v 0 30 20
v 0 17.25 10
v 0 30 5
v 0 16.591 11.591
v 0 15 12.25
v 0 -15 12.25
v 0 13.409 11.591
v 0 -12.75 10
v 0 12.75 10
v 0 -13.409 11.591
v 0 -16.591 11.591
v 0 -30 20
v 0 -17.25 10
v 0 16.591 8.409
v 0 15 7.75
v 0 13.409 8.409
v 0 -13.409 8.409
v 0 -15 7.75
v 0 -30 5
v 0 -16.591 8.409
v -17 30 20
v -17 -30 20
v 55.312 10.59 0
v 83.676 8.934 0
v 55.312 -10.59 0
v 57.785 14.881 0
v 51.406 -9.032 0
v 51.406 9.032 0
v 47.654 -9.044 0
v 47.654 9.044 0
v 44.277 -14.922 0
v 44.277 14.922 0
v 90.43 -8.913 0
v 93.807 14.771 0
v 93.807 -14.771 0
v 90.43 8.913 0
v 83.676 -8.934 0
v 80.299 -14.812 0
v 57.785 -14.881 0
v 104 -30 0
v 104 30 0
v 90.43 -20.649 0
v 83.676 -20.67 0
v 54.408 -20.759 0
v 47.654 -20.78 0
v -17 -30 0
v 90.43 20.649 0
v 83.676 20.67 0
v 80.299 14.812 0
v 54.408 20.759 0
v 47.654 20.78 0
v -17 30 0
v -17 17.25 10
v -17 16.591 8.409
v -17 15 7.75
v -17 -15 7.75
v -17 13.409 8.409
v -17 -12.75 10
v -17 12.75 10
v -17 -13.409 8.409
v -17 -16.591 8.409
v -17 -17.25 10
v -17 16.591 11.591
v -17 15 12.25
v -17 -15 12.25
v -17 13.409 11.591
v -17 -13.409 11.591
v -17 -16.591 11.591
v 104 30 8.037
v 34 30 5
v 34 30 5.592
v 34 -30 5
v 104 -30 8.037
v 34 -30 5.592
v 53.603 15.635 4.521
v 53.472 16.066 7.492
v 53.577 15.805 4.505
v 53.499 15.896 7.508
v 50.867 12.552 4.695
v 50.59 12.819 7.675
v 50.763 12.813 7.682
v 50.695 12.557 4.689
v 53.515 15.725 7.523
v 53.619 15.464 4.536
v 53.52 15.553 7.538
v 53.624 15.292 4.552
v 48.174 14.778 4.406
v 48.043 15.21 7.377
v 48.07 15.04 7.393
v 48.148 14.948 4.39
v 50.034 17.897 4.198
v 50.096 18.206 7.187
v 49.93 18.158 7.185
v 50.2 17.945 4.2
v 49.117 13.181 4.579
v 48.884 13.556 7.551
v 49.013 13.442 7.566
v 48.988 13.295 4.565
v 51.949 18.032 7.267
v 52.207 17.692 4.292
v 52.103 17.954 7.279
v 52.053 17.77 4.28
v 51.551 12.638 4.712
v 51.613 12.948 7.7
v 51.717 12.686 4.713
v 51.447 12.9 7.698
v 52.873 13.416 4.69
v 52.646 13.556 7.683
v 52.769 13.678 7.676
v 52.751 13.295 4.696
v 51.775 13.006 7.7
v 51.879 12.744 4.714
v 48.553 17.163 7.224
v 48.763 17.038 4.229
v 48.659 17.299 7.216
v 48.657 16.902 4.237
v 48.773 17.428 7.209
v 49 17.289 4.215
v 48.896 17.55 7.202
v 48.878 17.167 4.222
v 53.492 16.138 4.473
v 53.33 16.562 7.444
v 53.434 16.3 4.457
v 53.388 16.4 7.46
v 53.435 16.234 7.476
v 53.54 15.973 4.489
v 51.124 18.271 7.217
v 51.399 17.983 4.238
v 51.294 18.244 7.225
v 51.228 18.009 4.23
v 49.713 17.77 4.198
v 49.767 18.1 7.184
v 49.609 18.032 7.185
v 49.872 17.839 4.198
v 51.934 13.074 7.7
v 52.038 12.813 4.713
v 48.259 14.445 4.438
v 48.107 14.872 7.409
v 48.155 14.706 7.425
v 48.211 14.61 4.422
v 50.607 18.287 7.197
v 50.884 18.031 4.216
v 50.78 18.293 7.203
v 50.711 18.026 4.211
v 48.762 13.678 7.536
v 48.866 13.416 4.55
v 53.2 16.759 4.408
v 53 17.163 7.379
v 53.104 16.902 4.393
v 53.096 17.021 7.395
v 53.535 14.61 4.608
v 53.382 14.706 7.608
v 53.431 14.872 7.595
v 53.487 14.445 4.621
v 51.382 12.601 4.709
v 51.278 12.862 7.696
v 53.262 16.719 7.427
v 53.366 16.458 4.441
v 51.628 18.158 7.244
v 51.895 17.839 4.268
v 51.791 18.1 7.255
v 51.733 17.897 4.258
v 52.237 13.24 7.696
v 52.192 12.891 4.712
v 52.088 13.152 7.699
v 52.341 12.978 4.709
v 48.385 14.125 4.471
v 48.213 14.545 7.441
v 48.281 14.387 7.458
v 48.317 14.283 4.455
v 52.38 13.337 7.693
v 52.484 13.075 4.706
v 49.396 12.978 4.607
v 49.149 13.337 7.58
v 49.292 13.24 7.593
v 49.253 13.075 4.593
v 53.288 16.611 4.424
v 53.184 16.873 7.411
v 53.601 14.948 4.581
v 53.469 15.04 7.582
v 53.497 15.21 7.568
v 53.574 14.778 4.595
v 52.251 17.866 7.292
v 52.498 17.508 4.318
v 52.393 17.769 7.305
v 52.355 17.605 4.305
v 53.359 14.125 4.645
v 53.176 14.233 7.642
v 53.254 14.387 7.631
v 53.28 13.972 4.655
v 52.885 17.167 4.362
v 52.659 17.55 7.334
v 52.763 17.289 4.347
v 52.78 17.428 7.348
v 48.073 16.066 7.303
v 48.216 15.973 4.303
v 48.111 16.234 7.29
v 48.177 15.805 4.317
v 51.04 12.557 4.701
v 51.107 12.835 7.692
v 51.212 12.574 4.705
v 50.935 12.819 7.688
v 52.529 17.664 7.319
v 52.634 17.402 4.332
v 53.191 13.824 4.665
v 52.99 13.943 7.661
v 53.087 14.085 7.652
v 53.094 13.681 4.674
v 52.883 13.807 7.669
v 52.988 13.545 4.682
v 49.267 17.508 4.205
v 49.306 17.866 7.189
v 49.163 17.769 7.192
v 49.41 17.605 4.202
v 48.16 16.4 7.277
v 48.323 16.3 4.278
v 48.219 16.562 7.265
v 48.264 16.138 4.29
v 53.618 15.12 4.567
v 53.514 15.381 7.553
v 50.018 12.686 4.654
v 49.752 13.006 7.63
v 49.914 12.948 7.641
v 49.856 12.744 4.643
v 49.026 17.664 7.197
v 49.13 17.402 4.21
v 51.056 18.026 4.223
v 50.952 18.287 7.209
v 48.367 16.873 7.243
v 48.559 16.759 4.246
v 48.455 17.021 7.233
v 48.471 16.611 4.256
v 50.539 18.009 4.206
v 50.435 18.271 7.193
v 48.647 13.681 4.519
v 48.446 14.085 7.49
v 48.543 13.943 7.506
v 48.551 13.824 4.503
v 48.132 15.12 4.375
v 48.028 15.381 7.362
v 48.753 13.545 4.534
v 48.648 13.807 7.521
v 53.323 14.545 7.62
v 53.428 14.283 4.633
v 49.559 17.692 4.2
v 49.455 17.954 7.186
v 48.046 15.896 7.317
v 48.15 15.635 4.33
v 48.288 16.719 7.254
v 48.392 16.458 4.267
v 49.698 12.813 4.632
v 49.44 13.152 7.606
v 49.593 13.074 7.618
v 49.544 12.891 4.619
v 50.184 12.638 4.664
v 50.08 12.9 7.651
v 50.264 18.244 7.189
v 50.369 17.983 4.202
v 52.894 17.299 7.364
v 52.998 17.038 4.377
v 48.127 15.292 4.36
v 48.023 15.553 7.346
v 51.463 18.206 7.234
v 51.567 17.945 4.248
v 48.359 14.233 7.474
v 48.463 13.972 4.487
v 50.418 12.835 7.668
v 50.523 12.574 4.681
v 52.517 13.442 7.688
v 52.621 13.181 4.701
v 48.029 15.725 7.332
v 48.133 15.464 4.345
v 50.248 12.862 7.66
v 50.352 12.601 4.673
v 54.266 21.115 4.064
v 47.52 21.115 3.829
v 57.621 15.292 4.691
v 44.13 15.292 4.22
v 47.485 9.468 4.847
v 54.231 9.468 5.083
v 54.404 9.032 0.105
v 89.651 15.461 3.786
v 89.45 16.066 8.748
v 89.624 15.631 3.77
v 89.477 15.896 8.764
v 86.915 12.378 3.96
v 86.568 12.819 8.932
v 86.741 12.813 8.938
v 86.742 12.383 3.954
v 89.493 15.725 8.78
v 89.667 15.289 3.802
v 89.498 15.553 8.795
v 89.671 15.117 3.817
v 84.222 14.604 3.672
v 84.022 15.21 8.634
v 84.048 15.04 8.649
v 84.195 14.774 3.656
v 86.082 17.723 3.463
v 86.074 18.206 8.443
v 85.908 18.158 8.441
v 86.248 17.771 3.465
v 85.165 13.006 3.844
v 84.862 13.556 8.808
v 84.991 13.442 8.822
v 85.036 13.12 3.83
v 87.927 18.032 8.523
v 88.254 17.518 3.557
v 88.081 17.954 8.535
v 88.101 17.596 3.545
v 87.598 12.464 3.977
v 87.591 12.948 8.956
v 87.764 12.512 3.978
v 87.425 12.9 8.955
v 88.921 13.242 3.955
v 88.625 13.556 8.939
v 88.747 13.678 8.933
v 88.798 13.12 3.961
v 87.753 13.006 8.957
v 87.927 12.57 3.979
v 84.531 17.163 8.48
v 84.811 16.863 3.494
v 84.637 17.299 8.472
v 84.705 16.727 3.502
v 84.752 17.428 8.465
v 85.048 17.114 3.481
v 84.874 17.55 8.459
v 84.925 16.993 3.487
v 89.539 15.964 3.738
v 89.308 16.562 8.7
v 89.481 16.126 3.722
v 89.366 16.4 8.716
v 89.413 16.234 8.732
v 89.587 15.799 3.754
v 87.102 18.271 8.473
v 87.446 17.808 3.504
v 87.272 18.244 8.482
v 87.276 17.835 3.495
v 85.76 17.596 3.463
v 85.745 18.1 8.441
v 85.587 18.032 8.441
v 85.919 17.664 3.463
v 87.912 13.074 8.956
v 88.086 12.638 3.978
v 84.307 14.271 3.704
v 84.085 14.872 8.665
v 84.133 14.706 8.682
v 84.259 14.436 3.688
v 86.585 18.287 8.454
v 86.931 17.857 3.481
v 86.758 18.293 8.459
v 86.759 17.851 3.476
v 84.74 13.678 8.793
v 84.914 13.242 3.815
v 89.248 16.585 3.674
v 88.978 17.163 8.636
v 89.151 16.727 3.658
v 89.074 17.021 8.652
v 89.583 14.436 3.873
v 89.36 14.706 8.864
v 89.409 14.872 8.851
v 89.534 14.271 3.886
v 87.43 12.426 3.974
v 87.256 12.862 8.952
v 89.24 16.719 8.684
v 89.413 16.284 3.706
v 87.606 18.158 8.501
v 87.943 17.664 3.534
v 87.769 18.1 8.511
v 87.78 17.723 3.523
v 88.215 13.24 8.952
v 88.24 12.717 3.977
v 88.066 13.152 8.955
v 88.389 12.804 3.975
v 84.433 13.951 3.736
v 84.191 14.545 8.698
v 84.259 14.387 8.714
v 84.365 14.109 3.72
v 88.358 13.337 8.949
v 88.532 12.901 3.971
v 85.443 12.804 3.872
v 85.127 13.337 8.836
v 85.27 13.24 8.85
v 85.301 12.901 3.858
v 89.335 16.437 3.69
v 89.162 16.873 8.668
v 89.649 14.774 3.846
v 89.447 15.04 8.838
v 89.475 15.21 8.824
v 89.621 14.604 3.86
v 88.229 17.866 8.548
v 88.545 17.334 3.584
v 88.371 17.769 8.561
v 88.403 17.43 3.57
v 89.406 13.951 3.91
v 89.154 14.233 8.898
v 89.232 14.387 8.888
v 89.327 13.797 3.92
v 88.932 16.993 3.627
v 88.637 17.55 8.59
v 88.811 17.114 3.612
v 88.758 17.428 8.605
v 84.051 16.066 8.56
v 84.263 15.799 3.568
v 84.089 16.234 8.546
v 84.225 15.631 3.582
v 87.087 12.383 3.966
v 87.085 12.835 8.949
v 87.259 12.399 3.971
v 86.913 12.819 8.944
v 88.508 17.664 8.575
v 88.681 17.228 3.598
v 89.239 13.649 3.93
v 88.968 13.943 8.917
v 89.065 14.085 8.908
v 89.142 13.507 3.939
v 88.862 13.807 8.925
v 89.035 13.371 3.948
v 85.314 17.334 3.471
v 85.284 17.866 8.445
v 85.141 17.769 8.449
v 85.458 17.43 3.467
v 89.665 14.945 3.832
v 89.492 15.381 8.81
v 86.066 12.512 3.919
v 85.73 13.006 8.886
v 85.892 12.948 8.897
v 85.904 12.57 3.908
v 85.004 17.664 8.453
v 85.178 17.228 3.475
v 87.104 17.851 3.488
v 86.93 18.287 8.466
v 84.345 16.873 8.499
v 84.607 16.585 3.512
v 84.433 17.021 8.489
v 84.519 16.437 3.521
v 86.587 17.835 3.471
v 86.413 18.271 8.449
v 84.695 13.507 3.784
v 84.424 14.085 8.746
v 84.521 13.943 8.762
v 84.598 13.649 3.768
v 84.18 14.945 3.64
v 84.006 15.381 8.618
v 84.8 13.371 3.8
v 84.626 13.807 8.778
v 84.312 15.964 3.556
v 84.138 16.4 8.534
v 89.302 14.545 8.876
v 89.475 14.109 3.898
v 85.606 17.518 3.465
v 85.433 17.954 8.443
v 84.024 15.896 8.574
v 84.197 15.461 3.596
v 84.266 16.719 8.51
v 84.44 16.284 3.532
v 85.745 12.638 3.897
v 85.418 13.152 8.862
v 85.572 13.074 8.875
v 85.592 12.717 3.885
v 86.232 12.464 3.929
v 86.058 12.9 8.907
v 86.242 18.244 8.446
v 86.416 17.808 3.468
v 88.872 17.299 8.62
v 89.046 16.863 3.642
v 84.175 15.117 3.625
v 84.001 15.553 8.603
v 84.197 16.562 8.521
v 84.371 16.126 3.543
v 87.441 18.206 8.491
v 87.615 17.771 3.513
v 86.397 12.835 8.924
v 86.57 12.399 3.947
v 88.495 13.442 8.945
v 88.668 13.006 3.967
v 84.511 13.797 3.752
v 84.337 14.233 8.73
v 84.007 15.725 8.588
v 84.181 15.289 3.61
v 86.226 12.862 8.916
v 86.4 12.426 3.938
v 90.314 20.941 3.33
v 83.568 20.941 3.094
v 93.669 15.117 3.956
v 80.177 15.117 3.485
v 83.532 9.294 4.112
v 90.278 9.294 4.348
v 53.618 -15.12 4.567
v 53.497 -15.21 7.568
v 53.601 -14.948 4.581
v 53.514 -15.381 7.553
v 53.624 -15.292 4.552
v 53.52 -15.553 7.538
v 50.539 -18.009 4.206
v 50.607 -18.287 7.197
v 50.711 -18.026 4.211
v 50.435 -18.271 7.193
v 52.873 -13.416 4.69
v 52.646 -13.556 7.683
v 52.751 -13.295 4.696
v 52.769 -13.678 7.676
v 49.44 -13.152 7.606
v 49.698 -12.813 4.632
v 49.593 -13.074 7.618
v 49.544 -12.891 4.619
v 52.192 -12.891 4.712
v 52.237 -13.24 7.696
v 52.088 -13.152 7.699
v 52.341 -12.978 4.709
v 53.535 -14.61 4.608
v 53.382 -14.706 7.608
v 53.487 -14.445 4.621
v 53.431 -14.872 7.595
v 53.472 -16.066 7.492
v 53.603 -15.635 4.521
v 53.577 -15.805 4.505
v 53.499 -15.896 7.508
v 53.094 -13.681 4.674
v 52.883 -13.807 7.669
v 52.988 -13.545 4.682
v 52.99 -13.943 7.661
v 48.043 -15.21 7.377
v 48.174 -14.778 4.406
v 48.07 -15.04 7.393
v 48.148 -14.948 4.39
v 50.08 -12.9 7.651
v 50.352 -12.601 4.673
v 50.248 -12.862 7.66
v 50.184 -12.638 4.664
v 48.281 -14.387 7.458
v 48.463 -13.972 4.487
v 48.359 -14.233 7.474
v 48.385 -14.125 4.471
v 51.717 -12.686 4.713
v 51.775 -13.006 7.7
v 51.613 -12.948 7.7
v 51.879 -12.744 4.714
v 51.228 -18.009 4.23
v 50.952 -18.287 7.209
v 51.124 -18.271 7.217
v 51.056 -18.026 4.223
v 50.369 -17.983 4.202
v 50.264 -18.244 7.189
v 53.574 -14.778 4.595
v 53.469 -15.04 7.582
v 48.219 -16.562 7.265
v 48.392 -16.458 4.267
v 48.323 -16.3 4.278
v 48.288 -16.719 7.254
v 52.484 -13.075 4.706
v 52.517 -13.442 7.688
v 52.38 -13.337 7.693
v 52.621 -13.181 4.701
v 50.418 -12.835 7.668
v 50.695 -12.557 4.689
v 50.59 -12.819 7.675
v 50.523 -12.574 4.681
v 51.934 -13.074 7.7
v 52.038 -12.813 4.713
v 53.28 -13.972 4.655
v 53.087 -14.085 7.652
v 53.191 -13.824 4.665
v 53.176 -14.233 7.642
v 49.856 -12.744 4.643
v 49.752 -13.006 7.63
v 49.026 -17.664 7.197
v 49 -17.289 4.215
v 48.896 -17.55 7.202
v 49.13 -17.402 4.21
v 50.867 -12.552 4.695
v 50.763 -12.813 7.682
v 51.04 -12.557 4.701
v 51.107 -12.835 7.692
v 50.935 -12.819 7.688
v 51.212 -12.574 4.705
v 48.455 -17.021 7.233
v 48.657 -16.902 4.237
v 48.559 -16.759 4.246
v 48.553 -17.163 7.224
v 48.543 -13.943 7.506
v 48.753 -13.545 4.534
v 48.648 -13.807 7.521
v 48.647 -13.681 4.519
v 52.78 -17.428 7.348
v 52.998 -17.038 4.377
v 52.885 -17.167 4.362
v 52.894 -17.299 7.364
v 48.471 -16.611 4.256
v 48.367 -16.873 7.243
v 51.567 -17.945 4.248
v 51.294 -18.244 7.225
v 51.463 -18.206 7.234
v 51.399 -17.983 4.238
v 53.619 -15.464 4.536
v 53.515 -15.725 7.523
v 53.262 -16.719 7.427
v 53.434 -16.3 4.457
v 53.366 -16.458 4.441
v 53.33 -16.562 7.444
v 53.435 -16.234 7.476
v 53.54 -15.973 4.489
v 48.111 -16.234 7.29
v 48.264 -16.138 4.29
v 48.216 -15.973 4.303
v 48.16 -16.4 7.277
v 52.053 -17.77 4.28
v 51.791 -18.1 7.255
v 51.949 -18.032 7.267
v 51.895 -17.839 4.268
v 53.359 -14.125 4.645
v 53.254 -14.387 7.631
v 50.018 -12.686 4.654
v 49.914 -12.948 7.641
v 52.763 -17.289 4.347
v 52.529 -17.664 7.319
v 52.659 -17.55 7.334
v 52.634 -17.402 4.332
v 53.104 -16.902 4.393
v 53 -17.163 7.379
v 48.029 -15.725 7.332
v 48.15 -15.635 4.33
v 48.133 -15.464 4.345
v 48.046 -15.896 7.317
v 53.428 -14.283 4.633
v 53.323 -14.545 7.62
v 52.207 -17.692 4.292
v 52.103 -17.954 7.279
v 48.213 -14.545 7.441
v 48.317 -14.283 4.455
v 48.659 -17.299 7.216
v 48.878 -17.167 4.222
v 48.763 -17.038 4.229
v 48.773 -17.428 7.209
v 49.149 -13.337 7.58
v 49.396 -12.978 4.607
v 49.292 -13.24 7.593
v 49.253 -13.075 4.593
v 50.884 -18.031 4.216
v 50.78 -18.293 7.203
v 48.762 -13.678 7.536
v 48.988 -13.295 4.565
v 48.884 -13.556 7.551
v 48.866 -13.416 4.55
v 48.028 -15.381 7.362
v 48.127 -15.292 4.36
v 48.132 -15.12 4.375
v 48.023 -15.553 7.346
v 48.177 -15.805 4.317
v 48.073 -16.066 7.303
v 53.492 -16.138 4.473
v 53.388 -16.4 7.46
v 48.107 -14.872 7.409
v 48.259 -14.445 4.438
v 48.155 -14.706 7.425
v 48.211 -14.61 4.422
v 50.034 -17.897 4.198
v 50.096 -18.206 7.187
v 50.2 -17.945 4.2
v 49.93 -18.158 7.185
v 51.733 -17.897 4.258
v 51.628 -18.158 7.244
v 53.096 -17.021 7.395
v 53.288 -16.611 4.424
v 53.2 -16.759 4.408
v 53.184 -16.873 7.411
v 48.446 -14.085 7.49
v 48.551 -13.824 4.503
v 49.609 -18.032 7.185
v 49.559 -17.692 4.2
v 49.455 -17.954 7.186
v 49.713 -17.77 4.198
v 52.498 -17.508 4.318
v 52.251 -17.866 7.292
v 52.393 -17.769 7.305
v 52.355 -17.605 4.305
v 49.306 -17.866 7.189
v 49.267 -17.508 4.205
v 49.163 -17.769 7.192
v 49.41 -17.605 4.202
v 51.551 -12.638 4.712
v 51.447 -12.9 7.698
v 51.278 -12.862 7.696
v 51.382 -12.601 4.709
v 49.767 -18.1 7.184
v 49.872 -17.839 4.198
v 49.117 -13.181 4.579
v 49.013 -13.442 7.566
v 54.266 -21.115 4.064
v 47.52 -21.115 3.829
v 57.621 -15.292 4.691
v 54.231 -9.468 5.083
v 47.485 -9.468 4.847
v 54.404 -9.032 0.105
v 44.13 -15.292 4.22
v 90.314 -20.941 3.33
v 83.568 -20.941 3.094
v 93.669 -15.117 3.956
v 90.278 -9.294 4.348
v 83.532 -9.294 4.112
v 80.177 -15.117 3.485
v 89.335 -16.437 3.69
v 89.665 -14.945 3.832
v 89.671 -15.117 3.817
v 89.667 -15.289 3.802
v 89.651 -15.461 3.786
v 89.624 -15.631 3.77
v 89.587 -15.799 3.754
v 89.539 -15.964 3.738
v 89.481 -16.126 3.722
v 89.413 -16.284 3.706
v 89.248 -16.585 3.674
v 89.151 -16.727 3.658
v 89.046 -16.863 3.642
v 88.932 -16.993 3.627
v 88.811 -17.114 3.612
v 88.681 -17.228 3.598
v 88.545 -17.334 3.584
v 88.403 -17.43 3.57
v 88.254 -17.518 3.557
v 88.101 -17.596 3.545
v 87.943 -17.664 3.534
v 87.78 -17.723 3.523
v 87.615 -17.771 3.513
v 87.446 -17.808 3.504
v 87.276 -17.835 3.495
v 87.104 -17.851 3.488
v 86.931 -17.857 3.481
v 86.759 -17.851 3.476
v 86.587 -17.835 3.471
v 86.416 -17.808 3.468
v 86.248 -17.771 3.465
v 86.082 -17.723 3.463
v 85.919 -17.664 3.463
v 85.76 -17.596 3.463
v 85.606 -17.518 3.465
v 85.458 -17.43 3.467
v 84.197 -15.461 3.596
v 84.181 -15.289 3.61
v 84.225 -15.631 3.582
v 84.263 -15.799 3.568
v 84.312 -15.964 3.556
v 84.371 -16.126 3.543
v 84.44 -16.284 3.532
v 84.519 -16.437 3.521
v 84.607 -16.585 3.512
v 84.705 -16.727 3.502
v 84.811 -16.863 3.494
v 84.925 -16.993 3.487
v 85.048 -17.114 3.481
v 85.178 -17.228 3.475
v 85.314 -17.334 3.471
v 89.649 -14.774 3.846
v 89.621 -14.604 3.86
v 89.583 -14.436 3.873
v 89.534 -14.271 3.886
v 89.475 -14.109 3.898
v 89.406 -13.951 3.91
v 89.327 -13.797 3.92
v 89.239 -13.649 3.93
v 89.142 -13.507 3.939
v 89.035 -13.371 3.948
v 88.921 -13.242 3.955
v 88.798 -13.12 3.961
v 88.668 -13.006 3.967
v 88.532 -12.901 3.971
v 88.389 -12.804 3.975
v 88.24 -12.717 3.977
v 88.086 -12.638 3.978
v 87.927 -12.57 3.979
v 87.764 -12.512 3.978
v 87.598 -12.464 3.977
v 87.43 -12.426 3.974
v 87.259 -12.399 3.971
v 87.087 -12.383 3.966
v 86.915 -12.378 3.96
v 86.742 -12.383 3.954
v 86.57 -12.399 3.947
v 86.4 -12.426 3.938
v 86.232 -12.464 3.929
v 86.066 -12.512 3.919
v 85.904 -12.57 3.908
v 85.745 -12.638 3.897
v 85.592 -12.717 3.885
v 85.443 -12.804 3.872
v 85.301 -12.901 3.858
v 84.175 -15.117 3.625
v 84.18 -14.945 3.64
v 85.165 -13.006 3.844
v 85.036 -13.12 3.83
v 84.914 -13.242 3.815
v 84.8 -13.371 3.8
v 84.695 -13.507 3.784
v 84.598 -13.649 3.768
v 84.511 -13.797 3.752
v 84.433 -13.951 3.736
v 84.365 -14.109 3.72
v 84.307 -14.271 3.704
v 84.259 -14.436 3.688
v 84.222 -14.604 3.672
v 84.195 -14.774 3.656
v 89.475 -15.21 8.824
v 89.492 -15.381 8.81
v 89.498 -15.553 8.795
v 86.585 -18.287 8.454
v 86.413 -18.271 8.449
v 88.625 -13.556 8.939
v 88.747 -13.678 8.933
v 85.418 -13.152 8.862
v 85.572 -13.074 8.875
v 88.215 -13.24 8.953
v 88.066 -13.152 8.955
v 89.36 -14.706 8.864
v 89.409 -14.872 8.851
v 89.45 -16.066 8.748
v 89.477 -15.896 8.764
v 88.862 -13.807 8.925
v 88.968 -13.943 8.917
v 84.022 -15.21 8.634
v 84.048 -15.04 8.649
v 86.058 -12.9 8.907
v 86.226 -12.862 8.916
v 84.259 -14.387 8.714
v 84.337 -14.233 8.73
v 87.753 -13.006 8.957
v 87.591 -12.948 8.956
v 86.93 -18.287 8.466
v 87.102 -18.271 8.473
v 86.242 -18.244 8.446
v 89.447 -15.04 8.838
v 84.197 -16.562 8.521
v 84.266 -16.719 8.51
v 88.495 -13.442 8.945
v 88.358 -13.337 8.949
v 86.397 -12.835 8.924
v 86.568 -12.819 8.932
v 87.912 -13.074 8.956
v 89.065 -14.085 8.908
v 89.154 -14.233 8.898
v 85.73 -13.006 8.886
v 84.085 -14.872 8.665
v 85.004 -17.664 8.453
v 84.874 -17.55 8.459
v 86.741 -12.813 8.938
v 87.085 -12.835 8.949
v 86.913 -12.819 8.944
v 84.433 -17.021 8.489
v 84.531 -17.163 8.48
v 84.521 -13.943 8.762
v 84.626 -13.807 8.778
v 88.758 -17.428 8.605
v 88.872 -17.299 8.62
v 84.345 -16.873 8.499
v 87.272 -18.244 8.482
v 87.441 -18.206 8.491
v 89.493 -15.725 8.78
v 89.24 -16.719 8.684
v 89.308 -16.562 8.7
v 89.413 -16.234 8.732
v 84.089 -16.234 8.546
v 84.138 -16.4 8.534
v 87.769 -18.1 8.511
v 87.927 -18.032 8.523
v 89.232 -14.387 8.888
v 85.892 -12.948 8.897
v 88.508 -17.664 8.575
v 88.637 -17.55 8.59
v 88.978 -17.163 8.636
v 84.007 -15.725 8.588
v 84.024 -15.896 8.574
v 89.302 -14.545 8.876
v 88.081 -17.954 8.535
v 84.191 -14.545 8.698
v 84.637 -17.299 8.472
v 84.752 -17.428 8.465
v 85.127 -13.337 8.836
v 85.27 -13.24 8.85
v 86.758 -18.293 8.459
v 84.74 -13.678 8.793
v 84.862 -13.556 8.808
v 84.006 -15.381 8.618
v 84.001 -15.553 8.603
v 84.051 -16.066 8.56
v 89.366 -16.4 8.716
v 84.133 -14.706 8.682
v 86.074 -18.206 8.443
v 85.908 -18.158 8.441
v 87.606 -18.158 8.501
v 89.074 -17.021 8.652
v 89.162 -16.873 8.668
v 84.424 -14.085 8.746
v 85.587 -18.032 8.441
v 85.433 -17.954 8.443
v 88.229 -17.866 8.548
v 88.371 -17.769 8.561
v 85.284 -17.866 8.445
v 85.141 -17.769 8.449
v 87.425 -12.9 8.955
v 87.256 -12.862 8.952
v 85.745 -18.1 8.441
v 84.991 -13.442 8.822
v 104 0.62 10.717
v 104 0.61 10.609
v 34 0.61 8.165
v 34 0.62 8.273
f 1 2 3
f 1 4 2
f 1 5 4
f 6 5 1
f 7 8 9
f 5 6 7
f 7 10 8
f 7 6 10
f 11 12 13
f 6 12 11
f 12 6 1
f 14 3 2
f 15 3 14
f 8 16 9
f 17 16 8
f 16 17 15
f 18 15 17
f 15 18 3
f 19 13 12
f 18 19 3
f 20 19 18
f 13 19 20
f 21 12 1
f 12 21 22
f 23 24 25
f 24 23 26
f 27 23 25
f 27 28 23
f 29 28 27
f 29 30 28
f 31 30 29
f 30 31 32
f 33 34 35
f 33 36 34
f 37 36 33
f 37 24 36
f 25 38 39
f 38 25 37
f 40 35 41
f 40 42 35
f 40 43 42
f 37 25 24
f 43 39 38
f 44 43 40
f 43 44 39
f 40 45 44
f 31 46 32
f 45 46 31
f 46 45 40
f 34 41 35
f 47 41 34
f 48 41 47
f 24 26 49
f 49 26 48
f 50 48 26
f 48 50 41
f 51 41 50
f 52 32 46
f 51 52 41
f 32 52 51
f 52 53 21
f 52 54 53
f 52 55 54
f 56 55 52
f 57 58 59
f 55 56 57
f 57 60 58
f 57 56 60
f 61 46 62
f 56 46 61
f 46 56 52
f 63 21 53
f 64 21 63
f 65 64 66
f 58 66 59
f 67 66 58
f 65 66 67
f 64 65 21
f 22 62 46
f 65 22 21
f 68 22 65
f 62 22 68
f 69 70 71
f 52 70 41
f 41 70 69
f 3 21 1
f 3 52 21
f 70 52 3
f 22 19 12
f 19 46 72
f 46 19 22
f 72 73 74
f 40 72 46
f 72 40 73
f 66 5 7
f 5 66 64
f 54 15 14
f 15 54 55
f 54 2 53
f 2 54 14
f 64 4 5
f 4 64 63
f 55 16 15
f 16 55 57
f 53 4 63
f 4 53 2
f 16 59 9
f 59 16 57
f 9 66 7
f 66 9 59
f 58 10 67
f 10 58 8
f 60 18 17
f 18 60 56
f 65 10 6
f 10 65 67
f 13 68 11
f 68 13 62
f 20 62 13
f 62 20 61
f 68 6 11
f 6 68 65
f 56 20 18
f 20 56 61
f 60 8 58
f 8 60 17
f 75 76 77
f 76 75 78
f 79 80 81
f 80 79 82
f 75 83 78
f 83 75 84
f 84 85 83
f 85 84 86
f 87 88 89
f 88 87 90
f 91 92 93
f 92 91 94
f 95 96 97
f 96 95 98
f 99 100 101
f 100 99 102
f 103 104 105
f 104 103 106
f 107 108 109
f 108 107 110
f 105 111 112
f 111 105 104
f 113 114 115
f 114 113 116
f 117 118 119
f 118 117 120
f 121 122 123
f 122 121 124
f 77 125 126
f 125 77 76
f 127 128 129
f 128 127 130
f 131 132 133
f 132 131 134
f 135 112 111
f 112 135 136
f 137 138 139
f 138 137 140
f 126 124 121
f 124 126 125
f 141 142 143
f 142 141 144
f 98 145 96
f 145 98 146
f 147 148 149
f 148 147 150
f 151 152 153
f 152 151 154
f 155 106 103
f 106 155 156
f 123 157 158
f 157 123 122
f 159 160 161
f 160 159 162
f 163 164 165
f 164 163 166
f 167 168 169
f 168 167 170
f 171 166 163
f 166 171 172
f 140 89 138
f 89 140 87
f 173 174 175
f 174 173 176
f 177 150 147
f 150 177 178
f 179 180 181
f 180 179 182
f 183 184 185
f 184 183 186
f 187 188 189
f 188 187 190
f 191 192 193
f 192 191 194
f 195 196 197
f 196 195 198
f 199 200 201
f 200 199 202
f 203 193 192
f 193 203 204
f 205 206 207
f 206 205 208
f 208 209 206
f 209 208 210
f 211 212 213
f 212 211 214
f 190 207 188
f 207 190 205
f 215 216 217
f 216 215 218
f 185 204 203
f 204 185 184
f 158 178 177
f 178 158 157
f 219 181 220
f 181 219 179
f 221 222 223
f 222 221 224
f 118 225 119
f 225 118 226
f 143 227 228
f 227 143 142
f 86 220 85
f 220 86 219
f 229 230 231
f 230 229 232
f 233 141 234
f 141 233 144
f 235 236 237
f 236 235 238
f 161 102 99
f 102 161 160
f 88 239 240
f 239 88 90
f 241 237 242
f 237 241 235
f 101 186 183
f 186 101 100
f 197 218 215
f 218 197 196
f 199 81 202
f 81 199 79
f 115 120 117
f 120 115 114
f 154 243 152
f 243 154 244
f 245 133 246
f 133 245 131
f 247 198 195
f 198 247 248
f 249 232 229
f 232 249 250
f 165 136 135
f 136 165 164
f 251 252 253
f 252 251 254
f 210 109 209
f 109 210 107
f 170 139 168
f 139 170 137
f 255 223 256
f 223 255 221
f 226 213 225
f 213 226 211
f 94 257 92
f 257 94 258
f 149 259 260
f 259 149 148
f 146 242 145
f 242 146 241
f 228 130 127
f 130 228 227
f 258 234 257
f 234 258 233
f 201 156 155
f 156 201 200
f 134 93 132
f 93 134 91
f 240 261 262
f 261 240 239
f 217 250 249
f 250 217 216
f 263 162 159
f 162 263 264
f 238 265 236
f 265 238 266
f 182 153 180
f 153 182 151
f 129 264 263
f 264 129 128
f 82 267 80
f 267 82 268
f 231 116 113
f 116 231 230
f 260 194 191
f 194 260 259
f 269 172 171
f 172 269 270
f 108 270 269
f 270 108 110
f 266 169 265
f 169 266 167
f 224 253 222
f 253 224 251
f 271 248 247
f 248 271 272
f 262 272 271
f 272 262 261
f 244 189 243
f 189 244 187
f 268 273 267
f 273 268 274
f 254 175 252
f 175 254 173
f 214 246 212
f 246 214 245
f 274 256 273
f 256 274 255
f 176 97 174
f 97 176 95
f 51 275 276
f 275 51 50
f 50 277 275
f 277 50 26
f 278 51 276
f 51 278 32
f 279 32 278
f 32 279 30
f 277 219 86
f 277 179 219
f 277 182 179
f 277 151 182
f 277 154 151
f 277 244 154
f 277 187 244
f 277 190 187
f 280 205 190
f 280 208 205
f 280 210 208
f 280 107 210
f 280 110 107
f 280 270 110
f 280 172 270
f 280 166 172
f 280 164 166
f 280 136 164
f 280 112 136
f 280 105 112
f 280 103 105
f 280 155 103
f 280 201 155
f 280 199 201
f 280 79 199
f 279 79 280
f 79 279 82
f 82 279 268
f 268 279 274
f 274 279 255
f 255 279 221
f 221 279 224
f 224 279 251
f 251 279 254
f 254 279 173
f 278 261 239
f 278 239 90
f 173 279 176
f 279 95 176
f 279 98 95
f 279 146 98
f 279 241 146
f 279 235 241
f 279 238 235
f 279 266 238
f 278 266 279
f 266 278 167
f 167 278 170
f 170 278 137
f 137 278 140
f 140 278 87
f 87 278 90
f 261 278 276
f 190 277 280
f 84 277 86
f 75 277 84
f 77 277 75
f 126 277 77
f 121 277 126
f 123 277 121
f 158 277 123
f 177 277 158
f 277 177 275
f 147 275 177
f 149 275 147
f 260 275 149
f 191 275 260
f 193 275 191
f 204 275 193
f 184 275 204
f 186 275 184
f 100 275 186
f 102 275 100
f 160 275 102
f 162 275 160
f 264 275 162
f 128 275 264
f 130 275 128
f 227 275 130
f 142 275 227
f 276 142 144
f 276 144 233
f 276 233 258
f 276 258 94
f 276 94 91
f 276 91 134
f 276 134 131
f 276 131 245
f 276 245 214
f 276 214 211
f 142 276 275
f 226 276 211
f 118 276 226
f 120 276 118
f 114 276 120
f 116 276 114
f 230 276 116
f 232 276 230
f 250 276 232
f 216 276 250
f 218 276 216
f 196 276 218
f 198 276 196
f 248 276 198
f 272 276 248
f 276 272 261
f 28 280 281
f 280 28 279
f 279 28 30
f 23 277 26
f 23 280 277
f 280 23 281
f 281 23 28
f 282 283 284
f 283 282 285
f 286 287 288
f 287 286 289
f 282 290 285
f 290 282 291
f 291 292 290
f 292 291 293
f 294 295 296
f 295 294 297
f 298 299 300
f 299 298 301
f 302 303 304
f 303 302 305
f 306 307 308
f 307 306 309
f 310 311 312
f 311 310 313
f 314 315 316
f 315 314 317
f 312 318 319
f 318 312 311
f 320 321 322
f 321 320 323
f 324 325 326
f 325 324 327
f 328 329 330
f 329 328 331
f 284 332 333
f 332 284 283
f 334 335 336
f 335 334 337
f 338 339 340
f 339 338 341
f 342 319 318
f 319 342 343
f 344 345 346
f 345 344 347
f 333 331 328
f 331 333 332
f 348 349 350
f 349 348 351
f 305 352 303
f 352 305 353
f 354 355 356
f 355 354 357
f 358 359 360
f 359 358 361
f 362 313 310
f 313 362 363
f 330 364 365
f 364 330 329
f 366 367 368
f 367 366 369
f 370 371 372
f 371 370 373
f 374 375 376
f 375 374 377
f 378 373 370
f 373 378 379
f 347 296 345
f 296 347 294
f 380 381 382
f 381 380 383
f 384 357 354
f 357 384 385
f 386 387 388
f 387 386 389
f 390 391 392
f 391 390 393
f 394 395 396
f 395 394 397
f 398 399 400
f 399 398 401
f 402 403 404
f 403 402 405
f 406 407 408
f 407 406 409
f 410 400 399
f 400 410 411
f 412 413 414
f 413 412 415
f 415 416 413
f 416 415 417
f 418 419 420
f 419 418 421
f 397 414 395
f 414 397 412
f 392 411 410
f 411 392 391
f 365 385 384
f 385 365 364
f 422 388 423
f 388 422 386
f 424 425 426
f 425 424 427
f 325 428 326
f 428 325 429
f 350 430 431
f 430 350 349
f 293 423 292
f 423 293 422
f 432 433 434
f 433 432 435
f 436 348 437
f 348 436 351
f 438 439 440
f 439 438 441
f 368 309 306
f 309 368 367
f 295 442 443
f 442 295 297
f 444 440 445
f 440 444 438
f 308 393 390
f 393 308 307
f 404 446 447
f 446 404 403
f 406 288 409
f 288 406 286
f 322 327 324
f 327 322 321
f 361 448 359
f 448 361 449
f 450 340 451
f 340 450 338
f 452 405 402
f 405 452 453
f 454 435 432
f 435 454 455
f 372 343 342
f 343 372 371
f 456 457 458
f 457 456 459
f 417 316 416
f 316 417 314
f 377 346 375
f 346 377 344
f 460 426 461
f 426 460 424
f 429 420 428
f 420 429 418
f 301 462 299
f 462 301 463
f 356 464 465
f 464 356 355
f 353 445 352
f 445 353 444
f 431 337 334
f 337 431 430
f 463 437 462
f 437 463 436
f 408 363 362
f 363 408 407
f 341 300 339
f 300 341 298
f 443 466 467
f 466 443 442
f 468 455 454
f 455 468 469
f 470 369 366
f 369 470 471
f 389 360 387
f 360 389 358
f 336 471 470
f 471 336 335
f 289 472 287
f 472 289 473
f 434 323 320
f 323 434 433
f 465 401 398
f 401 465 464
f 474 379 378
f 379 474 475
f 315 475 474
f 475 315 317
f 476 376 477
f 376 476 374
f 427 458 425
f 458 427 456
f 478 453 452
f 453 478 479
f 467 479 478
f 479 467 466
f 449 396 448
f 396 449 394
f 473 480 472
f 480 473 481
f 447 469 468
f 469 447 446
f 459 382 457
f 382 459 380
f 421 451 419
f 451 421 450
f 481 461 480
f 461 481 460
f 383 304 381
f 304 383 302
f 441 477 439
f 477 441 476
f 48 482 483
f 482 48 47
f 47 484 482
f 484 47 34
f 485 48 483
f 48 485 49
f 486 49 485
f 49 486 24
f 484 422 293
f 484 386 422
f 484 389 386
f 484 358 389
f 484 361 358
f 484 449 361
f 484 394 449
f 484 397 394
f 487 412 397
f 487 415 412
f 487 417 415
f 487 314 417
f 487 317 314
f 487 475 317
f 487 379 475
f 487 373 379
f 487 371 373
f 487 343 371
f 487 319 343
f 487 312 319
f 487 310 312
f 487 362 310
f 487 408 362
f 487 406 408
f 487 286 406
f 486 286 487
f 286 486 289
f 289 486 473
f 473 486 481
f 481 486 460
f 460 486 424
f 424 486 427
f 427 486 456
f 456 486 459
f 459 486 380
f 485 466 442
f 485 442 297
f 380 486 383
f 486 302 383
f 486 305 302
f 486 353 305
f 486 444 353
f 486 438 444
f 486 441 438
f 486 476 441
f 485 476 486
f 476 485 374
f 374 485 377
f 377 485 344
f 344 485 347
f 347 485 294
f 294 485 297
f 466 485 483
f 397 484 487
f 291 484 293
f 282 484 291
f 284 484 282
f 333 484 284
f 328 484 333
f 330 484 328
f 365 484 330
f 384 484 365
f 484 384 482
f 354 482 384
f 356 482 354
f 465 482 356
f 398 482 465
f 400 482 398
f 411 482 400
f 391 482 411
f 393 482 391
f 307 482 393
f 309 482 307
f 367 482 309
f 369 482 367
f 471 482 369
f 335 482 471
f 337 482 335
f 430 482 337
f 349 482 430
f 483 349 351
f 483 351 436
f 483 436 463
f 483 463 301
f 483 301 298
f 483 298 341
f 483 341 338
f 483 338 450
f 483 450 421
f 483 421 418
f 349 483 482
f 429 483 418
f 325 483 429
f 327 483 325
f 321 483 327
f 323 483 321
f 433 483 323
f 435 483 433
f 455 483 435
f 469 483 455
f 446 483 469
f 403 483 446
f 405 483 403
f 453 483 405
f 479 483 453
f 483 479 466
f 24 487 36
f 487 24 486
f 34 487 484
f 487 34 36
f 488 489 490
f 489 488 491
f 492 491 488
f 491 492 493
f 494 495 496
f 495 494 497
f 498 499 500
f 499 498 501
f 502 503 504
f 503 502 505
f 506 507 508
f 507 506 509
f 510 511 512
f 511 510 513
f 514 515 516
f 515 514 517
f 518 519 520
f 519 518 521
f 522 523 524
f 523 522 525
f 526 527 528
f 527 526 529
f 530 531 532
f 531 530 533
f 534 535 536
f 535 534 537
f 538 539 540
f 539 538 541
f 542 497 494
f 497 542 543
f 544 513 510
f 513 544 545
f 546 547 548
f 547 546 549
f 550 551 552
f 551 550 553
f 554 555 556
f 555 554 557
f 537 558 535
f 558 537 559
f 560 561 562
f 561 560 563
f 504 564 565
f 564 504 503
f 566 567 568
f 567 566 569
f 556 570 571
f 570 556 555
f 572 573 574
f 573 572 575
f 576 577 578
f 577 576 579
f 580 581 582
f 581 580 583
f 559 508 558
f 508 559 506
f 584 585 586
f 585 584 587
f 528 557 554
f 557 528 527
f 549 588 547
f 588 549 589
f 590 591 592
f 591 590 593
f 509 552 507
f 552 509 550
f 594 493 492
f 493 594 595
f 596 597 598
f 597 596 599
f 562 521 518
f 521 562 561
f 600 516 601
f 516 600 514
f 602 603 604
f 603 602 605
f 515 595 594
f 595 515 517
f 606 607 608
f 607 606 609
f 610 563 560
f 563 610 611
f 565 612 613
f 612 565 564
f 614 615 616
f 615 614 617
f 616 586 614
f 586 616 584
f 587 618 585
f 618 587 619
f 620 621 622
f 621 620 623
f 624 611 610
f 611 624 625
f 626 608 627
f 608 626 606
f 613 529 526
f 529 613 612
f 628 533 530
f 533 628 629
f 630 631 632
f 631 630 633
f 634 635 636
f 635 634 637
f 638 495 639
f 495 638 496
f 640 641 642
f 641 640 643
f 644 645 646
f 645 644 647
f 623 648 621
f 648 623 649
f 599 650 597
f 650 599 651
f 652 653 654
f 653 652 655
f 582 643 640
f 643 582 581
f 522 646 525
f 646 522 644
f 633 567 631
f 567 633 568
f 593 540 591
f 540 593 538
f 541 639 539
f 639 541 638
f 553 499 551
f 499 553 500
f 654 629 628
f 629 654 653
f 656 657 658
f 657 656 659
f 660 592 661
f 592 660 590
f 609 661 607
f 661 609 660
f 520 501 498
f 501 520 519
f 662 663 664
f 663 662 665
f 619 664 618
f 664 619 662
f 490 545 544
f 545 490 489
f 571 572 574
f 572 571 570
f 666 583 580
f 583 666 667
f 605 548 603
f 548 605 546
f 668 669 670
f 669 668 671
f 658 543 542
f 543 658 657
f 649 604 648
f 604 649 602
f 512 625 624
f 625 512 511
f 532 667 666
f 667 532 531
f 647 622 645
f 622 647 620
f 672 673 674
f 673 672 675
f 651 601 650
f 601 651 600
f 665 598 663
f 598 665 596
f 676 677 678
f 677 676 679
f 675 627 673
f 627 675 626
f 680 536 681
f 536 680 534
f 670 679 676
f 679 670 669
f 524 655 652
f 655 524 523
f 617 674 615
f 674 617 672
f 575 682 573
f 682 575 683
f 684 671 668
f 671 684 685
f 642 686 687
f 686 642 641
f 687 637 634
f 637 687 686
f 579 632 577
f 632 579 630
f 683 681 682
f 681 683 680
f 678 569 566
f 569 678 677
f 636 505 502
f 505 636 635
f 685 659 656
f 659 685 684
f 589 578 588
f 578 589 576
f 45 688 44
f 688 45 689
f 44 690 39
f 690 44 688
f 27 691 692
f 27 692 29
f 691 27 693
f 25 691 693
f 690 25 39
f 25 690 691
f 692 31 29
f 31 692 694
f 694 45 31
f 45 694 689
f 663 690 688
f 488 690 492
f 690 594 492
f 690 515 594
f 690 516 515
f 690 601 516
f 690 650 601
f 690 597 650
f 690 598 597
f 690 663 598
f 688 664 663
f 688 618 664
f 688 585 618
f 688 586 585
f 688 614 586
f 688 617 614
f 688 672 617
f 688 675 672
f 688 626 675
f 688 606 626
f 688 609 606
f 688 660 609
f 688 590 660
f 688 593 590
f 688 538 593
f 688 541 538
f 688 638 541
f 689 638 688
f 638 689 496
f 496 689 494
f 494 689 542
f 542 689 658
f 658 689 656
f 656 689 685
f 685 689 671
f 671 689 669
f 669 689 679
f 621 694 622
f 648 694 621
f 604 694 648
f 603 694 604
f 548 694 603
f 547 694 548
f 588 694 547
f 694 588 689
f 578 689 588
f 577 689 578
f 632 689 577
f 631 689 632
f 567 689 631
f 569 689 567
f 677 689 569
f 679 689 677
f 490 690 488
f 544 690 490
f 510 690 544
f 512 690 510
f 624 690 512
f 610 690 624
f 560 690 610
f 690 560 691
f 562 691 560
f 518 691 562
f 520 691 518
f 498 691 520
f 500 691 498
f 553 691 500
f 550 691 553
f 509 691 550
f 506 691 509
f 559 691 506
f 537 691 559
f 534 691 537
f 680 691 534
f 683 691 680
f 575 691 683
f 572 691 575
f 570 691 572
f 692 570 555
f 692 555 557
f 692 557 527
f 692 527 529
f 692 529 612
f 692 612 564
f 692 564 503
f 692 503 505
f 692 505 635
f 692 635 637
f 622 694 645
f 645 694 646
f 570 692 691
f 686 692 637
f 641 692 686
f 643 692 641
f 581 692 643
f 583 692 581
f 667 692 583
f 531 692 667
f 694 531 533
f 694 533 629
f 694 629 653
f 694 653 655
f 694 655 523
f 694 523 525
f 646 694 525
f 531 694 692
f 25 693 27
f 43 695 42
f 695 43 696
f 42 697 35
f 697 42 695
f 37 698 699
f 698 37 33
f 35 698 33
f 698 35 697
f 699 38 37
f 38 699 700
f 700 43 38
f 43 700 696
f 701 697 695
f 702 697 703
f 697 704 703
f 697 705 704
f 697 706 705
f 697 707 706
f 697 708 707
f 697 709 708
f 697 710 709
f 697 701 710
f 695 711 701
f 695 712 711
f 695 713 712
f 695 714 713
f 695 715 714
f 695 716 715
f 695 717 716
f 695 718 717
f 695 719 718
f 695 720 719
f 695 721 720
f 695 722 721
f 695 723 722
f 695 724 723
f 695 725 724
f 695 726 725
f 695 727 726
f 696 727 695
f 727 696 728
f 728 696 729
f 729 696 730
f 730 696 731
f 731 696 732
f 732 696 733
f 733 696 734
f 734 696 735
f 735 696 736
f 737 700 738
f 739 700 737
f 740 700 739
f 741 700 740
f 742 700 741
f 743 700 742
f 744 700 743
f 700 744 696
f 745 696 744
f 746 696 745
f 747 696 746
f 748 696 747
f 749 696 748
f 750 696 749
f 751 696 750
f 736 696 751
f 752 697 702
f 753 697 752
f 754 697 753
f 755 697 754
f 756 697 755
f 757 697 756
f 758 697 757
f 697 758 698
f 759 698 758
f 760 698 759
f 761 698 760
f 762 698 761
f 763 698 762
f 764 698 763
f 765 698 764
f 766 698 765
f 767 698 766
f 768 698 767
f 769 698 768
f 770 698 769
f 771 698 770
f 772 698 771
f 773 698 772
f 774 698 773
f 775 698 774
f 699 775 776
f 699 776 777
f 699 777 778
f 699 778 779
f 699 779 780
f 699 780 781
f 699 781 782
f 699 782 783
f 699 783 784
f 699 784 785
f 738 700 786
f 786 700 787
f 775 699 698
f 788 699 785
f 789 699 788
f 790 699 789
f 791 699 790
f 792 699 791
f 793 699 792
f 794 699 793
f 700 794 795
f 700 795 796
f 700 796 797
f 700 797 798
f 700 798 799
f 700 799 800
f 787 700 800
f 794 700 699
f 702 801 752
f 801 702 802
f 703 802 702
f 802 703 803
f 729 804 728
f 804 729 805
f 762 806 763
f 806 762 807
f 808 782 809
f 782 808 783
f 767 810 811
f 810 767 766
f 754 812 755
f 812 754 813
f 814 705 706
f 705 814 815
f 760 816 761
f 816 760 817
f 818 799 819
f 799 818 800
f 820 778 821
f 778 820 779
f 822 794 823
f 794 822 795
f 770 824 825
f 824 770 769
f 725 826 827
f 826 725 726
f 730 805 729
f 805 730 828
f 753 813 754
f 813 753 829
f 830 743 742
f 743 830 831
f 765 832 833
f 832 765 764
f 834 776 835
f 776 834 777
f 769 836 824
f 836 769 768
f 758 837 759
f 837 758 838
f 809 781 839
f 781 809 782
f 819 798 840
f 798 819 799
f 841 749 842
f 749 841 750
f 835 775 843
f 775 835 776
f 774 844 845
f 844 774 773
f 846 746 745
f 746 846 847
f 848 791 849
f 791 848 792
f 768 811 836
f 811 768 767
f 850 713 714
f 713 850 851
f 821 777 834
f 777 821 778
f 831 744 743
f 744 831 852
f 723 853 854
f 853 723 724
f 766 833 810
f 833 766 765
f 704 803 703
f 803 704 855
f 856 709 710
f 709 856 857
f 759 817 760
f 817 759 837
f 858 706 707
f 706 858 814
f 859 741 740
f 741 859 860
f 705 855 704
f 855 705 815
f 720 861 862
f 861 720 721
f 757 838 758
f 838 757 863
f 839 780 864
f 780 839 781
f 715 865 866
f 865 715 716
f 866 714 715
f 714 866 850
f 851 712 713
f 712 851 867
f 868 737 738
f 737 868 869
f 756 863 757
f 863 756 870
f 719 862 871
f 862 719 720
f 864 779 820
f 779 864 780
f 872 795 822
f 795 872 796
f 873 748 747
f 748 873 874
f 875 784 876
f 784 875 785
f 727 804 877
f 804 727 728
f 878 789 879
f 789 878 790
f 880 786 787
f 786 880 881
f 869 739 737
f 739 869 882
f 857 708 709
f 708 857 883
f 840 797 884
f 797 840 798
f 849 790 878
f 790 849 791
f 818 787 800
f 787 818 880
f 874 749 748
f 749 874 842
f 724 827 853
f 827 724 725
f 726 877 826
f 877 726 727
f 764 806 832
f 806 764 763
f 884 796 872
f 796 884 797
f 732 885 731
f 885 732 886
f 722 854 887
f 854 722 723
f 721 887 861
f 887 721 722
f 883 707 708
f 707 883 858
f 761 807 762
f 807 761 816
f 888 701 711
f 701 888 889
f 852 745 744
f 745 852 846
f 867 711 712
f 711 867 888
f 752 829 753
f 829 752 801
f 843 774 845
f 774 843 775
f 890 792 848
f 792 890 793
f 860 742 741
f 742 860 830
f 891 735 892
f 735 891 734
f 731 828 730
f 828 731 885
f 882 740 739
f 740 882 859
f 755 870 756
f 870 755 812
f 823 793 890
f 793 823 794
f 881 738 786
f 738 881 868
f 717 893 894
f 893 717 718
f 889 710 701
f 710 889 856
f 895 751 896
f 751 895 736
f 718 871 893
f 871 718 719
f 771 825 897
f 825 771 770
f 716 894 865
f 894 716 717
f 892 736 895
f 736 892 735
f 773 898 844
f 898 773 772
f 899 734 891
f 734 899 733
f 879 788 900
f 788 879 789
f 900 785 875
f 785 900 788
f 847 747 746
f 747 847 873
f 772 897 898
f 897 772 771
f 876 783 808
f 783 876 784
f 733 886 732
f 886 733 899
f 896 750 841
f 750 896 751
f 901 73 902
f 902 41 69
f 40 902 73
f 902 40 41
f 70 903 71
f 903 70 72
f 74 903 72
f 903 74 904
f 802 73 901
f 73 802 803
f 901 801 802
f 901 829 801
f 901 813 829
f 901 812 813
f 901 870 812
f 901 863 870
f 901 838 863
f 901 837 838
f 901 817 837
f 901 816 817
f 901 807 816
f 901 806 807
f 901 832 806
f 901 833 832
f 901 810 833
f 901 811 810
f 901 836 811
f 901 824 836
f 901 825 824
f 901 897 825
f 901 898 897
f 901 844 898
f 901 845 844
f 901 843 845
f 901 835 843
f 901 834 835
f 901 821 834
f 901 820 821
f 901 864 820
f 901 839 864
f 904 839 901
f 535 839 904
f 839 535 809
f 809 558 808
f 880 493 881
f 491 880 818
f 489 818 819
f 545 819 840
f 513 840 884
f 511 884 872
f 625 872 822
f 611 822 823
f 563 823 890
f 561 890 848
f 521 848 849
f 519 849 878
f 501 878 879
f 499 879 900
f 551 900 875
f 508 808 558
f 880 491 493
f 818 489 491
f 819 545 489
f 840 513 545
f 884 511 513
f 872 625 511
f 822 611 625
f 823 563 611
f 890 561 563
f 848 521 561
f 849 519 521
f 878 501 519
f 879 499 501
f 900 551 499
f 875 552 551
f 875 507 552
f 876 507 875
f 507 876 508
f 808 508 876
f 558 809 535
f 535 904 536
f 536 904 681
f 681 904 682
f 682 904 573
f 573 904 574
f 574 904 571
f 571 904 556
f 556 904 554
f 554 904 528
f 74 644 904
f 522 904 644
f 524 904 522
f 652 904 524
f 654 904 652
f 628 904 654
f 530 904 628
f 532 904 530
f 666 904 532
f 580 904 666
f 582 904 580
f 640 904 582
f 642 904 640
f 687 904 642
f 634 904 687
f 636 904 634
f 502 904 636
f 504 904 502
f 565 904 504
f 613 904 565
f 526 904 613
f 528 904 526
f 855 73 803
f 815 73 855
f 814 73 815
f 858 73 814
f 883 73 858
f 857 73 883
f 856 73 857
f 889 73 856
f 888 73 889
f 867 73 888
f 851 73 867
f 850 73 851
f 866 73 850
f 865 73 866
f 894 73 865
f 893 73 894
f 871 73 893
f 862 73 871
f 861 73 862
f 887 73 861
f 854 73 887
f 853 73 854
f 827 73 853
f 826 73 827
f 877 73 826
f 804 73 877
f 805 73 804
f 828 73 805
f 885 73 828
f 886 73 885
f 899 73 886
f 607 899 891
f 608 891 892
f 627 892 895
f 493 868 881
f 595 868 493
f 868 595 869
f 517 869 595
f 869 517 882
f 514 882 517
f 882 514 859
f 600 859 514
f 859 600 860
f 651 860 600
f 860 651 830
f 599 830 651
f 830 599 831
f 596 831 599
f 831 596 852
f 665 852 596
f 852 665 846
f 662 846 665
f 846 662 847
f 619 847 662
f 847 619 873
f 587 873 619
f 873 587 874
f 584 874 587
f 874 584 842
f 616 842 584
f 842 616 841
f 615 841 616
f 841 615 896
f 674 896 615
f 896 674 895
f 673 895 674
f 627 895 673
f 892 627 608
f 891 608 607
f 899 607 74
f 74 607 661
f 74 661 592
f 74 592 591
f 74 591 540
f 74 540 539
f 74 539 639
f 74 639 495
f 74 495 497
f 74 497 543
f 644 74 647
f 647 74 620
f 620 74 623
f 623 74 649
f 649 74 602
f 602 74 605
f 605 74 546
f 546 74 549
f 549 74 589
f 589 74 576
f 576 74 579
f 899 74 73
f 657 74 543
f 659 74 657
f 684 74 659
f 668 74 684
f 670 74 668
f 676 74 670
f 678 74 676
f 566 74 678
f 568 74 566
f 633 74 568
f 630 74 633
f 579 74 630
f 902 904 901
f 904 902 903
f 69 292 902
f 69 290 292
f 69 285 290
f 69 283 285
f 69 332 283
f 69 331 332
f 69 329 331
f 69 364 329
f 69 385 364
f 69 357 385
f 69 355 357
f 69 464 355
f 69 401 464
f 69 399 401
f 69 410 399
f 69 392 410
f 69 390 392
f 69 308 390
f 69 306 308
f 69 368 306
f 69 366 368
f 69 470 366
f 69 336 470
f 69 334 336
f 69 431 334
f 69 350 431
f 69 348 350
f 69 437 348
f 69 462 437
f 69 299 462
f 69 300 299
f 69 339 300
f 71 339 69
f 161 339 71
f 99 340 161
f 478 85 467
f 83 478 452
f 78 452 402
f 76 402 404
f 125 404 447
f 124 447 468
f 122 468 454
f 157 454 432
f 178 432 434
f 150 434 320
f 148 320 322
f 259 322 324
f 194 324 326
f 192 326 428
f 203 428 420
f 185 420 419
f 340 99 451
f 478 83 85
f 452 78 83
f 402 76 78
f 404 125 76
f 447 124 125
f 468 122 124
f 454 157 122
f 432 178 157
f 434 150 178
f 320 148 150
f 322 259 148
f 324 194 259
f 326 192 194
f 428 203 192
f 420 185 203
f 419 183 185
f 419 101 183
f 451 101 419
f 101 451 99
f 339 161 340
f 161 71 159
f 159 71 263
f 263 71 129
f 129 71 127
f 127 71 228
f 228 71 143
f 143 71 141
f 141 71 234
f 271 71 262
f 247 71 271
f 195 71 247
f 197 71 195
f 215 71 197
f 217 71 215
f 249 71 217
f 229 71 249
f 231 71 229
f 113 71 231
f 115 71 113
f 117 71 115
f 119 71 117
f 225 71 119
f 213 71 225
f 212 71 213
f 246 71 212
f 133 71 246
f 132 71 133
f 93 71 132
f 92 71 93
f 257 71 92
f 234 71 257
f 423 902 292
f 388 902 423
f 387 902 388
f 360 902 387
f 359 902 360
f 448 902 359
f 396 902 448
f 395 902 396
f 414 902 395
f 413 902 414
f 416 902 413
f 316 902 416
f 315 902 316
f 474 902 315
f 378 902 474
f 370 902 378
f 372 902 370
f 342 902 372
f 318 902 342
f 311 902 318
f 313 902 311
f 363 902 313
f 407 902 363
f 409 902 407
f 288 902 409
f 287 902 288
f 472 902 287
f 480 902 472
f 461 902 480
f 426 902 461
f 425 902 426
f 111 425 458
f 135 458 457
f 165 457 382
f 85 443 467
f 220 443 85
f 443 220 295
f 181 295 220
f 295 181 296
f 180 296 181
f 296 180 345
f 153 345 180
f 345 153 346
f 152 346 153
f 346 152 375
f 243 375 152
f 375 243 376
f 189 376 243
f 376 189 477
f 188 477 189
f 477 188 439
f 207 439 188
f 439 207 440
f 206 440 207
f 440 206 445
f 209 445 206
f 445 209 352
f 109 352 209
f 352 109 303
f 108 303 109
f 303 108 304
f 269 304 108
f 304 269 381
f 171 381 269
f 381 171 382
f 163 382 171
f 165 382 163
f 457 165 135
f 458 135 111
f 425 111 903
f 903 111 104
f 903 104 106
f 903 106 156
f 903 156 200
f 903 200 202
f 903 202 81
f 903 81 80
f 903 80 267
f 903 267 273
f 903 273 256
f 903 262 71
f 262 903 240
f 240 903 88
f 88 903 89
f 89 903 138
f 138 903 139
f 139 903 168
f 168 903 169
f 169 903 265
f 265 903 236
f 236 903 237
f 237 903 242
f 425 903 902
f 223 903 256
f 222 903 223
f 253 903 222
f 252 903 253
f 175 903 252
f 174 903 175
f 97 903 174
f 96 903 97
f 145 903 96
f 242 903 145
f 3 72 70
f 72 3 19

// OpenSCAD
//include<../UST/Parameters.scad>
//Screw diameter and nut for M5 [mm]
M5_screw_diameter=5.5;
M5_head_height = 5;
M5_head_diameter = 13+0.5;
M5_nut_height = 4.5;
M5_nut_diameter = 9.4;
M5_nut_pocket = 8.4;


//Screw diameter and nut for M4 [mm]
M4_screw_diameter=4.5;
M4_screw_head_height = 4;
M4_nut_height = 3.2;
M4_nut_diameter = 8.4;
M4_nut_pocket = 7.5;
M4_screw_head_diameter=6;

g3_0_srcew_dist = 55;

draft = false;
center_diameter = 140;
center_height = 10;
connecting_module_length = 17;
distance_bearing = 180;
distance = distance_bearing-center_diameter/2 - connecting_module_length*2 -7;
leg_width = 60;
pitch_bearing = 15;
bearing_angle_side=5;
bearing_angle_inner=-2;
pad_bearing_height = M5_head_height+10;

difference(){
    //spojovaci cast mezi loziskem a pripojovaci casti
    translate([0,-leg_width/2,0])
        cube([distance-35,leg_width,center_height/2]);
}

//pripojovací část
difference(){
    translate([-connecting_module_length,-leg_width/2,0])
        cube([connecting_module_length,leg_width,center_height*2]);

    translate([-connecting_module_length/2,15,center_height])
        rotate([0,90,0]){
            cylinder(h=connecting_module_length*2,d=M4_screw_diameter,center=true);
        }
    translate([-connecting_module_length/2,-15,center_height])
        rotate([0,90,0]){
            cylinder(h=connecting_module_length*2,d=M4_screw_diameter,center=true);
        }
}
difference(){
    //základna
    translate([distance+35-70,-leg_width/2,0])
        cube([70,leg_width,pad_bearing_height]);

    //naklon
    rotate([bearing_angle_side,bearing_angle_inner,0]){
        translate([distance+35-70,-leg_width/2,M5_head_height+2])
            cube([70+2,leg_width/2+5,center_height]);
    }
    //naklon
    rotate([-bearing_angle_side,bearing_angle_inner,0]){
        translate([distance-70+35,0,M5_head_height+2])
            cube([70+2,leg_width/2+5,center_height]);
    }
    connecting_bearing_hole();
}

// diry pro pripojeni lozisek
module connecting_bearing_hole(y){
    //jedna strana
    rotate([-bearing_angle_side,bearing_angle_inner,0]){
        translate([distance-18,pitch_bearing,0])
            cylinder(h=center_height,d=M5_screw_diameter,$fn=draft?50:100);
        translate([distance-18,pitch_bearing,-1])
            cylinder(h=M5_head_height,d=M5_head_diameter,$fn=6);

        translate([distance+18,pitch_bearing,0])
            cylinder(h=center_height,d=M5_screw_diameter,$fn=draft?50:100);
        translate([distance+18,pitch_bearing,-3])
            cylinder(h=M5_head_height,d=M5_head_diameter,$fn=6);

    }
    //druha strana
    rotate([bearing_angle_side,bearing_angle_inner,0]){
        translate([distance-18,-pitch_bearing,0])
            cylinder(h=center_height,d=M5_screw_diameter,$fn=draft?50:100);
        translate([distance-18,-pitch_bearing,-1])
            cylinder(h=M5_head_height,d=M5_head_diameter,$fn=6);

        translate([distance+18,-pitch_bearing,-3])
            cylinder(h=M5_head_height,d=M5_head_diameter,$fn=6);
        translate([distance+18,-pitch_bearing,0])
            cylinder(h=center_height,d=M5_screw_diameter,$fn=draft?50:100);
    }
}
